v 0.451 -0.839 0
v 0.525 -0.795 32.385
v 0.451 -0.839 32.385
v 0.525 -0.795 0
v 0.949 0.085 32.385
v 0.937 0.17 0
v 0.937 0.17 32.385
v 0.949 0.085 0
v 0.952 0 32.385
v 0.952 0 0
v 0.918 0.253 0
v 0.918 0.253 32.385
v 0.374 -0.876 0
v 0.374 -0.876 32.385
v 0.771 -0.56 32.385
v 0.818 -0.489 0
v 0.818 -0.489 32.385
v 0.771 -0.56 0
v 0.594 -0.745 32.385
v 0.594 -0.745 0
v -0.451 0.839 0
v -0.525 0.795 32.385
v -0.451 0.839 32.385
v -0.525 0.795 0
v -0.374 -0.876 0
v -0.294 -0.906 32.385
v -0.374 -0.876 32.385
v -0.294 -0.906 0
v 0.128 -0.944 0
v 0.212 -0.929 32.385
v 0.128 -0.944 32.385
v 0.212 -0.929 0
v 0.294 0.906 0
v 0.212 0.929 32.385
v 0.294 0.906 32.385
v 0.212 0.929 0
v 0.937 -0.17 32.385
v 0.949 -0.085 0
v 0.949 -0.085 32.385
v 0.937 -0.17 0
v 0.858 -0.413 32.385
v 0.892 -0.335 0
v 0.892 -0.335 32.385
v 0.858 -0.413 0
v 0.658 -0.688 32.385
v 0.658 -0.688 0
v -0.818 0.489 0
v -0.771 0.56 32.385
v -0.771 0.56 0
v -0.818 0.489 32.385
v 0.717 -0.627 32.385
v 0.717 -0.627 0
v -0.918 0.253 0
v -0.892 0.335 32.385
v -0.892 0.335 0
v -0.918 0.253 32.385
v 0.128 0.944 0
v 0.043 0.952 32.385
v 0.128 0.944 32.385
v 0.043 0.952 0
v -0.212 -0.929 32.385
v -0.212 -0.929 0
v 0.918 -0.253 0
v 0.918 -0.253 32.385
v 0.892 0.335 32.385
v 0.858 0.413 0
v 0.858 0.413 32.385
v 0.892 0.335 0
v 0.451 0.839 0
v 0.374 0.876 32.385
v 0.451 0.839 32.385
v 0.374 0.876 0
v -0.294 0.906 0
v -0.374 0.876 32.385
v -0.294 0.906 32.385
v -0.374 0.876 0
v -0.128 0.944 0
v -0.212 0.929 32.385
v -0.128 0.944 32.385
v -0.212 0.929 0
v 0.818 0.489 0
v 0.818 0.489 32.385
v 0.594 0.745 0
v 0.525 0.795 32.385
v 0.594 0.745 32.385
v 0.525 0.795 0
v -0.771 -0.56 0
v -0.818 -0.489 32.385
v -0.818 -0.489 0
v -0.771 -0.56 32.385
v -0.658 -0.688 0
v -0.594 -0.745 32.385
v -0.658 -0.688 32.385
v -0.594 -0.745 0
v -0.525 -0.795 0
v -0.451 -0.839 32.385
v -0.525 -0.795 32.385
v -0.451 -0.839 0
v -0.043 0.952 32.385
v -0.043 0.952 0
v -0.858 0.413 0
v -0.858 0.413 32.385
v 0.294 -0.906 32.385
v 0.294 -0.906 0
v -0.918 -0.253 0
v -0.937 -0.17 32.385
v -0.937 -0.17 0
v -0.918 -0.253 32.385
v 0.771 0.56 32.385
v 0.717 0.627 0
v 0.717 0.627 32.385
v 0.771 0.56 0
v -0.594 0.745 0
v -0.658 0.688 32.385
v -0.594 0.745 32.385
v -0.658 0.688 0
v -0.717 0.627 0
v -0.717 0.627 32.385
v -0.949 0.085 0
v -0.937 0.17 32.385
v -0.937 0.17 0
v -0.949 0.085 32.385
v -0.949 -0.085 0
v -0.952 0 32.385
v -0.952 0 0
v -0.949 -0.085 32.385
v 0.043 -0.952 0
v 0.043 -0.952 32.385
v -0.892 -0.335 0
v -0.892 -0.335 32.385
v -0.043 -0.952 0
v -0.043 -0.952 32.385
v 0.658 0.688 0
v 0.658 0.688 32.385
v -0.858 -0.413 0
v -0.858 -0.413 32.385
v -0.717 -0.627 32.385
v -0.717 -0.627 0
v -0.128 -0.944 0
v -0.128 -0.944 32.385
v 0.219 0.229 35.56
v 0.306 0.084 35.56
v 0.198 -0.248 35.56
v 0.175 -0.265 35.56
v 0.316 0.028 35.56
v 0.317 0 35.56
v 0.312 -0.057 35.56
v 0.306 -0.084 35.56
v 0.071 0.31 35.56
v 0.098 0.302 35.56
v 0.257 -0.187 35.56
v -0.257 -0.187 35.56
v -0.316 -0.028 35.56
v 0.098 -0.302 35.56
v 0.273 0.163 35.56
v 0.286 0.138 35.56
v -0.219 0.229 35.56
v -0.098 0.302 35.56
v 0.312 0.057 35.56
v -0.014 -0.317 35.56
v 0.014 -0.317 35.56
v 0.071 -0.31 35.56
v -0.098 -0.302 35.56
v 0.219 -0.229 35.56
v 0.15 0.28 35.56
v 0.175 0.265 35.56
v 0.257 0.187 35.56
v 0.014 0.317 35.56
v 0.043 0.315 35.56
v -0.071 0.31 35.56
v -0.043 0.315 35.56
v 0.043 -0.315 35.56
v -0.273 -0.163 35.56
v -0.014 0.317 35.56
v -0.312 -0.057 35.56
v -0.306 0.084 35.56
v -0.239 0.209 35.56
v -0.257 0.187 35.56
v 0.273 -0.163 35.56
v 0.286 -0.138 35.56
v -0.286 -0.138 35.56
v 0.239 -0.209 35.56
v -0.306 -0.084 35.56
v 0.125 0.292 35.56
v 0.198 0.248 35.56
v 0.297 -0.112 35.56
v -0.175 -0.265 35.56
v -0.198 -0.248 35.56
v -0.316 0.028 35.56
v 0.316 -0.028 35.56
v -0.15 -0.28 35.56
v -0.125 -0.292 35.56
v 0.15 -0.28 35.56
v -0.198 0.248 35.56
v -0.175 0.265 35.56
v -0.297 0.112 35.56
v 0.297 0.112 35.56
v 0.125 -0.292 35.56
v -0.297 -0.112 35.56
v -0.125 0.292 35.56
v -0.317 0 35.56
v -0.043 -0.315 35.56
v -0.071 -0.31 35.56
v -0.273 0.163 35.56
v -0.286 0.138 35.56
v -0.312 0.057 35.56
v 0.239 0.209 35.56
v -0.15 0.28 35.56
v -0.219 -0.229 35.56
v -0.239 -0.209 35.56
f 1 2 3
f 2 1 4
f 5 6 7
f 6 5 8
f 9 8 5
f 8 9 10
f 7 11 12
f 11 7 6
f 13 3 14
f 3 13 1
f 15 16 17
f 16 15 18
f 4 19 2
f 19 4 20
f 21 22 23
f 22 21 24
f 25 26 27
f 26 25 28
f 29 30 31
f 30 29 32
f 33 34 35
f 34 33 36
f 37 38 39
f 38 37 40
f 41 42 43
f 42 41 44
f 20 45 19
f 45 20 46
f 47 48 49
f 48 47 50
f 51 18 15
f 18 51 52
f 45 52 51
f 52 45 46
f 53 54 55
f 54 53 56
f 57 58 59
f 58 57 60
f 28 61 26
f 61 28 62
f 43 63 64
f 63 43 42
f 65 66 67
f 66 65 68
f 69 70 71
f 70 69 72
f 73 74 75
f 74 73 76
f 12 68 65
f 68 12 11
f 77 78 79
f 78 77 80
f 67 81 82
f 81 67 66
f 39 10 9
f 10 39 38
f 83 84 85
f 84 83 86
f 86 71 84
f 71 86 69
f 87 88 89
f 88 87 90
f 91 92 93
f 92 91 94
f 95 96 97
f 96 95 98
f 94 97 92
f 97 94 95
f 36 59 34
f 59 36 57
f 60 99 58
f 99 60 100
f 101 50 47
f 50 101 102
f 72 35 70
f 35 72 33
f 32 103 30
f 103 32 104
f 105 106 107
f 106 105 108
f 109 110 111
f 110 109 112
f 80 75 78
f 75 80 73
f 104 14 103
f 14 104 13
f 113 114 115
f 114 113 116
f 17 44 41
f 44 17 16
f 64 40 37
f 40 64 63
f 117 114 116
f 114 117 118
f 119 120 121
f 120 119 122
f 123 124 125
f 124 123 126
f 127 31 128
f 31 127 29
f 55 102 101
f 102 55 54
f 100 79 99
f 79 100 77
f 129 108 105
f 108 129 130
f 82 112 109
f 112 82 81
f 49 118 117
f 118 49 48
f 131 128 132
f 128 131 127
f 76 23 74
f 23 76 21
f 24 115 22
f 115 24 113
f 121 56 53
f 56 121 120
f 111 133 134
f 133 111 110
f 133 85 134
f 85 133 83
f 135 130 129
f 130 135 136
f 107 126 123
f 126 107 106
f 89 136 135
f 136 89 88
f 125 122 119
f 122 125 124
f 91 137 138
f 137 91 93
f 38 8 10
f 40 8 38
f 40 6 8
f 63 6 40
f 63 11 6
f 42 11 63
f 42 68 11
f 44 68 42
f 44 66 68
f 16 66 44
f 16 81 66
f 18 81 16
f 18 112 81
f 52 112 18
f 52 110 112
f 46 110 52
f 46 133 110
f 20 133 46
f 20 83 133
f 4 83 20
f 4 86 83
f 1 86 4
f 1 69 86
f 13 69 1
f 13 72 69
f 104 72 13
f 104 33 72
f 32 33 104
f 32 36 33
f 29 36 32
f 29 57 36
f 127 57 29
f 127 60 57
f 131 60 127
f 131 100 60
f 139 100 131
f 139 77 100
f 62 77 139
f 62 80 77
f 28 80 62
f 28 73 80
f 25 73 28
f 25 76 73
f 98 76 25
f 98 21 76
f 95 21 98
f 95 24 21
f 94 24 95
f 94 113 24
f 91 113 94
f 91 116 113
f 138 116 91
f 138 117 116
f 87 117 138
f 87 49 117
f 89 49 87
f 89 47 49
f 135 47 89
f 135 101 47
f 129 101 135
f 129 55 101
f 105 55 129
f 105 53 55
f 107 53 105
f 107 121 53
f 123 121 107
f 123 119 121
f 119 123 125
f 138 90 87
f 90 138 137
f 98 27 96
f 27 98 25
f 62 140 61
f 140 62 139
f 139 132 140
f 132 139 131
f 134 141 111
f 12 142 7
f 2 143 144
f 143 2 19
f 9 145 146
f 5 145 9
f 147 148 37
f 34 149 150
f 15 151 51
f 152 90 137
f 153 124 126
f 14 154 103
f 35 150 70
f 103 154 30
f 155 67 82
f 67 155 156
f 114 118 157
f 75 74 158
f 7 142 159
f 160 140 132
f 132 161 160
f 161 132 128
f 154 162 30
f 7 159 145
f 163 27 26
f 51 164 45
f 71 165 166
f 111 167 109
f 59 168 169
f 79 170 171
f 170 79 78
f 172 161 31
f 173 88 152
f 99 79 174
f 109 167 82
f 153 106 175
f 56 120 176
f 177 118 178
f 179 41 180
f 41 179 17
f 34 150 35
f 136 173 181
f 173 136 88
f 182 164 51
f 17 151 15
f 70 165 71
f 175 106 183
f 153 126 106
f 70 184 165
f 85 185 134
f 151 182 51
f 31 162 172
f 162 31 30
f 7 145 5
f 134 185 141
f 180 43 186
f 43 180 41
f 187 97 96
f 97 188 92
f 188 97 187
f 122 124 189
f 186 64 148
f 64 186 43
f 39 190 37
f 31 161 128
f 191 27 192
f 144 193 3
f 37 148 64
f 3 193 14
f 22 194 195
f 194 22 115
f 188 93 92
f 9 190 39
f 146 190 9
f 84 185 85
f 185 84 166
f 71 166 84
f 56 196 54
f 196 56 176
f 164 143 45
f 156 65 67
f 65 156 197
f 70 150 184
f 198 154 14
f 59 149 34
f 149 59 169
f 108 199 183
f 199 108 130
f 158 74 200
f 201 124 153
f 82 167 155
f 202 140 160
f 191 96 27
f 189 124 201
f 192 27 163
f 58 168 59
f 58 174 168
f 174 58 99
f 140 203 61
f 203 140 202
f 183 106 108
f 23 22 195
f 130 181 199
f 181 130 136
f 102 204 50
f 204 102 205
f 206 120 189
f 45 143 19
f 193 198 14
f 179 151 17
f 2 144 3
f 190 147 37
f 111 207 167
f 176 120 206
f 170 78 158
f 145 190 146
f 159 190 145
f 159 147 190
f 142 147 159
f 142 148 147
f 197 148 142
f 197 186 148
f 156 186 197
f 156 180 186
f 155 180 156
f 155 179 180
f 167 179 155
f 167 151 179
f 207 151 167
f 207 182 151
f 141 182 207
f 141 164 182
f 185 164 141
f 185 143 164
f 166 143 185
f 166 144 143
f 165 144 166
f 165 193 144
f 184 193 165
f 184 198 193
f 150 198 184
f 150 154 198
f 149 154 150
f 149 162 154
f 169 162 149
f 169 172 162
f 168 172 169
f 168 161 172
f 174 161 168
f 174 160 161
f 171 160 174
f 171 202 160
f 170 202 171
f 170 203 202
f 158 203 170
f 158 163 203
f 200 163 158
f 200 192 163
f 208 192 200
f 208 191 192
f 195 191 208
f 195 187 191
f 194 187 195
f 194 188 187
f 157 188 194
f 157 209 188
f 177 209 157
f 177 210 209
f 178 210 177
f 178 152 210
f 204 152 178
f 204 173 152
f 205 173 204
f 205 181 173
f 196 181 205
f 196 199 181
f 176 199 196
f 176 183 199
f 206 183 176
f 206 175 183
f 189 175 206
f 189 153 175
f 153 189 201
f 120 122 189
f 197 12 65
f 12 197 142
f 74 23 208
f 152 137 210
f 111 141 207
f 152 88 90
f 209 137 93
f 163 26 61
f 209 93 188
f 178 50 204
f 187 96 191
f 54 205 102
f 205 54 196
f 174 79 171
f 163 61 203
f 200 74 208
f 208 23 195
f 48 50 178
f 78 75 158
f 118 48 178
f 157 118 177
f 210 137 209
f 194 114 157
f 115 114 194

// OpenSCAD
// Part   : Component 10 - Front Mast
// Author : Rafi Khan
// Team   : Innovator

cylinder(h=32.385, d=1.905, center=false, $fn=70);
translate([0, 0, 32.385]) {
	cylinder(h=3.175, d1=1.905, d2=0.635, center=false, $fn=70);
}
